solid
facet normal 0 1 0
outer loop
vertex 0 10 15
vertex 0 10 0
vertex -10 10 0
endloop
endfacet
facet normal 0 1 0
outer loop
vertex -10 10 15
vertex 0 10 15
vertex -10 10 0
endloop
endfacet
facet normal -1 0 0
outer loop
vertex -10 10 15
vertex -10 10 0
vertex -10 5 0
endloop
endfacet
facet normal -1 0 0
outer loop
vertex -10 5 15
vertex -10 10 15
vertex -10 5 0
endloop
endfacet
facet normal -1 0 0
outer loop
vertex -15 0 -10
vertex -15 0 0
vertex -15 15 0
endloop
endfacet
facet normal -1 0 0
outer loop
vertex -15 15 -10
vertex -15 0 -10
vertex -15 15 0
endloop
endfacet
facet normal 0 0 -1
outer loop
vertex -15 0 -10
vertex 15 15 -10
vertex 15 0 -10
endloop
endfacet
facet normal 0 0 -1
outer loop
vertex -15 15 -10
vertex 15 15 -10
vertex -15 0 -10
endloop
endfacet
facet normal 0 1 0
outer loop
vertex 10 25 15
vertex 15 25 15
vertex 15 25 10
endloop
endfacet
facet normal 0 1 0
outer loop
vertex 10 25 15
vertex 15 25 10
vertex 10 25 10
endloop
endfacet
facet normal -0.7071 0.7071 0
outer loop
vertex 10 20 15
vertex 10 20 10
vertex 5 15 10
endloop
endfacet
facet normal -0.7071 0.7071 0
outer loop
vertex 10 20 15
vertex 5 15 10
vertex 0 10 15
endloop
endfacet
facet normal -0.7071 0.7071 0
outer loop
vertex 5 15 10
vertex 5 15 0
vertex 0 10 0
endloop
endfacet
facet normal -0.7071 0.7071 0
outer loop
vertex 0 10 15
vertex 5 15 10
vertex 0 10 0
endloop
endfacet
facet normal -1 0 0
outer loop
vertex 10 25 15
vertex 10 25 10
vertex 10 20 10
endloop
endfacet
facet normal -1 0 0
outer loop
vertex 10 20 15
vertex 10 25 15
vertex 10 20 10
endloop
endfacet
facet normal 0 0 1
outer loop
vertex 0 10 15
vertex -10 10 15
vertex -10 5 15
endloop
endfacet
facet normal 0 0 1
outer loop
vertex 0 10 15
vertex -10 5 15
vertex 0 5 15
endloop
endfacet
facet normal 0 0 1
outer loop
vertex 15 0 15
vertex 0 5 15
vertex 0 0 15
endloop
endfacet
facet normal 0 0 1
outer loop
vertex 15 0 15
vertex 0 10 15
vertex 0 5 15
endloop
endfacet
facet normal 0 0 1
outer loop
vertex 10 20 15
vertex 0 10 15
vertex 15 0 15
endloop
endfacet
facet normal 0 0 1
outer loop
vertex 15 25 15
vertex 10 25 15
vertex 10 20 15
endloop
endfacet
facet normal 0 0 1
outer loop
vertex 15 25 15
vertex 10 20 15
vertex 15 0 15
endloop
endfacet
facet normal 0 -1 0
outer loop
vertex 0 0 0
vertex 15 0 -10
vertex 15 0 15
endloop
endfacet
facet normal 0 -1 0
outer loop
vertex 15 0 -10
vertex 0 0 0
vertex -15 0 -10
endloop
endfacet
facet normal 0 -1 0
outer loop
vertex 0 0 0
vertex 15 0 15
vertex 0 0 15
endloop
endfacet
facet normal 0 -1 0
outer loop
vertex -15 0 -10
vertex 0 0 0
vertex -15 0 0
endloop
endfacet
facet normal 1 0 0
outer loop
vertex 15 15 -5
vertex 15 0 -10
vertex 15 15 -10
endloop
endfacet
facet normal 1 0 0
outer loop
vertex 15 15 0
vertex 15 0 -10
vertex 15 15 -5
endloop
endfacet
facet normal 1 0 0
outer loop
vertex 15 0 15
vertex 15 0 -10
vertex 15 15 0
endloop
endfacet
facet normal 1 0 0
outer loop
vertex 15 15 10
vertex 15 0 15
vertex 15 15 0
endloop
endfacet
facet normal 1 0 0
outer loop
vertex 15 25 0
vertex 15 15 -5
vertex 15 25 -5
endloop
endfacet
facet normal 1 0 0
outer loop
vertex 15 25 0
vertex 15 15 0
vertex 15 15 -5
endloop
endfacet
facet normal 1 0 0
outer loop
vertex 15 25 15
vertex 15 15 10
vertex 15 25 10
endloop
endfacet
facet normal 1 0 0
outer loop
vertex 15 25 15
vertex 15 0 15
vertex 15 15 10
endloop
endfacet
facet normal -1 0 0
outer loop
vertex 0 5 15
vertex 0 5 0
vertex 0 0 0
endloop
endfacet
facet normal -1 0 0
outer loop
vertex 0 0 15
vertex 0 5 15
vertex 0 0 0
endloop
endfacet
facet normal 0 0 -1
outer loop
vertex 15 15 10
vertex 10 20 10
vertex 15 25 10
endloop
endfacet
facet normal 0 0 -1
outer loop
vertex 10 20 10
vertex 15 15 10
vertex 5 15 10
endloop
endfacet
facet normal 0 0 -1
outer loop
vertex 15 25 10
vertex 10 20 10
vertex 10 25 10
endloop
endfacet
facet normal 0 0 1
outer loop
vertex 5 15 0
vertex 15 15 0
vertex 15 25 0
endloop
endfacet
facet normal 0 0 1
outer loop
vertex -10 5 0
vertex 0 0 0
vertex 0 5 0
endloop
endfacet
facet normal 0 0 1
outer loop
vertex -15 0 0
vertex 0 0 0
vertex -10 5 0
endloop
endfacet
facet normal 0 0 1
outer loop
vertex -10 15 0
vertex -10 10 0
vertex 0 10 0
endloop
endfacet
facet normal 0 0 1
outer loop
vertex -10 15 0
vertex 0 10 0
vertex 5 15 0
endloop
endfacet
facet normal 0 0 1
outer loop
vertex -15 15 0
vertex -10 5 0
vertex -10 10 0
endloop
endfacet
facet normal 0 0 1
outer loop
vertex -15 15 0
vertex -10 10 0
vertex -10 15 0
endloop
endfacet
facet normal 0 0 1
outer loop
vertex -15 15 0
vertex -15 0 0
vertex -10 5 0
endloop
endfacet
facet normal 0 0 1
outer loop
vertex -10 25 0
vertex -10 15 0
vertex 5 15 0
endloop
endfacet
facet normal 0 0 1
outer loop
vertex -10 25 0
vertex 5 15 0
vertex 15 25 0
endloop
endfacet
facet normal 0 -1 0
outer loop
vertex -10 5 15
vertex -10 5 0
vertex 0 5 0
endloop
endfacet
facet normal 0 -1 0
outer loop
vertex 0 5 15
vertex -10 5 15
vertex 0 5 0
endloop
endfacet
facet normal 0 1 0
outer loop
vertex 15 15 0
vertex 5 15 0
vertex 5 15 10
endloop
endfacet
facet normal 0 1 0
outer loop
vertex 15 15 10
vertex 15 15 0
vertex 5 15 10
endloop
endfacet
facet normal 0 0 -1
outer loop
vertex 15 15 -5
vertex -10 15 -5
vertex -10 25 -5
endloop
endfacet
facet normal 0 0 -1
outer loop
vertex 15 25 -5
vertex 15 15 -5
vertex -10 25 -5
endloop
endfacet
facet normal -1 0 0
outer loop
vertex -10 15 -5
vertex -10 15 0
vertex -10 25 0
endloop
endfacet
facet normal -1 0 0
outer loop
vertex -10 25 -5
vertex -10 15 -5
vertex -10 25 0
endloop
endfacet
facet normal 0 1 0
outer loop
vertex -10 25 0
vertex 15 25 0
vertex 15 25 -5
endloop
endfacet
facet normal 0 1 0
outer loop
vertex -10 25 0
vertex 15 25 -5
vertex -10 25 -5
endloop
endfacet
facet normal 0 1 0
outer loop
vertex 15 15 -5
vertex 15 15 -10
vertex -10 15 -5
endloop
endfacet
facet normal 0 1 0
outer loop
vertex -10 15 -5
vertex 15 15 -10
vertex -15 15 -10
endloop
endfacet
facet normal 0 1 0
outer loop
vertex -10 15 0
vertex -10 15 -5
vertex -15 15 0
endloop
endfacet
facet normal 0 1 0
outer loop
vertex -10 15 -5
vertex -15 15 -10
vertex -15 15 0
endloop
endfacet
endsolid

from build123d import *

# Parameters (mm, degrees)
BOSS_EXTRUDE1_DEPTH = 15
SKETCH2_W           = 30
SKETCH2_H           = 25
BOSS_EXTRUDE2_DEPTH = 10
SKETCH3_W           = 5
SKETCH3_H           = 10
CUT_EXTRUDE1_DEPTH  = 15
SKETCH6_W           = 5
SKETCH6_H           = 10
CUT_EXTRUDE4_DEPTH  = 30
SKETCH7_W           = 10
SKETCH7_H           = 10
CUT_EXTRUDE5_DEPTH  = 30


with BuildPart() as part:
    # Sketch1 → Boss-Extrude1 (new body)
    with BuildSketch(Plane.XY):
        Polygon((0, 0), (15, 0), (15, 25), (10, 25), (10, 20), (0, 10), (-10, 10), (-10, 5), (0, 5), align=None)
    extrude(amount=BOSS_EXTRUDE1_DEPTH)

    # Sketch2 → Boss-Extrude2 (add)
    with BuildSketch(Plane(origin=(0, 0, 0), x_dir=(-1, 0, 0), z_dir=(0, 0, -1))):
        with Locations((0, 12.5)):
            Rectangle(SKETCH2_W, SKETCH2_H)
    extrude(amount=BOSS_EXTRUDE2_DEPTH)

    # Sketch3 → Cut-Extrude1 (cut)
    with BuildSketch(Plane.XY):
        with Locations((-12.5, 20)):
            Rectangle(SKETCH3_W, SKETCH3_H)
    extrude(amount=-CUT_EXTRUDE1_DEPTH, mode=Mode.SUBTRACT)

    # Sketch6 → Cut-Extrude4 (cut)
    with BuildSketch(Plane.ZY.offset(10)):
        with Locations((-7.5, 20)):
            Rectangle(SKETCH6_W, SKETCH6_H)
    extrude(amount=-CUT_EXTRUDE4_DEPTH, mode=Mode.SUBTRACT)

    # Sketch7 → Cut-Extrude5 (cut)
    with BuildSketch(Plane.ZY.offset(10)):
        with Locations((5, 20)):
            Rectangle(SKETCH7_W, SKETCH7_H)
    extrude(amount=-CUT_EXTRUDE5_DEPTH, mode=Mode.SUBTRACT)


solid = part.part
